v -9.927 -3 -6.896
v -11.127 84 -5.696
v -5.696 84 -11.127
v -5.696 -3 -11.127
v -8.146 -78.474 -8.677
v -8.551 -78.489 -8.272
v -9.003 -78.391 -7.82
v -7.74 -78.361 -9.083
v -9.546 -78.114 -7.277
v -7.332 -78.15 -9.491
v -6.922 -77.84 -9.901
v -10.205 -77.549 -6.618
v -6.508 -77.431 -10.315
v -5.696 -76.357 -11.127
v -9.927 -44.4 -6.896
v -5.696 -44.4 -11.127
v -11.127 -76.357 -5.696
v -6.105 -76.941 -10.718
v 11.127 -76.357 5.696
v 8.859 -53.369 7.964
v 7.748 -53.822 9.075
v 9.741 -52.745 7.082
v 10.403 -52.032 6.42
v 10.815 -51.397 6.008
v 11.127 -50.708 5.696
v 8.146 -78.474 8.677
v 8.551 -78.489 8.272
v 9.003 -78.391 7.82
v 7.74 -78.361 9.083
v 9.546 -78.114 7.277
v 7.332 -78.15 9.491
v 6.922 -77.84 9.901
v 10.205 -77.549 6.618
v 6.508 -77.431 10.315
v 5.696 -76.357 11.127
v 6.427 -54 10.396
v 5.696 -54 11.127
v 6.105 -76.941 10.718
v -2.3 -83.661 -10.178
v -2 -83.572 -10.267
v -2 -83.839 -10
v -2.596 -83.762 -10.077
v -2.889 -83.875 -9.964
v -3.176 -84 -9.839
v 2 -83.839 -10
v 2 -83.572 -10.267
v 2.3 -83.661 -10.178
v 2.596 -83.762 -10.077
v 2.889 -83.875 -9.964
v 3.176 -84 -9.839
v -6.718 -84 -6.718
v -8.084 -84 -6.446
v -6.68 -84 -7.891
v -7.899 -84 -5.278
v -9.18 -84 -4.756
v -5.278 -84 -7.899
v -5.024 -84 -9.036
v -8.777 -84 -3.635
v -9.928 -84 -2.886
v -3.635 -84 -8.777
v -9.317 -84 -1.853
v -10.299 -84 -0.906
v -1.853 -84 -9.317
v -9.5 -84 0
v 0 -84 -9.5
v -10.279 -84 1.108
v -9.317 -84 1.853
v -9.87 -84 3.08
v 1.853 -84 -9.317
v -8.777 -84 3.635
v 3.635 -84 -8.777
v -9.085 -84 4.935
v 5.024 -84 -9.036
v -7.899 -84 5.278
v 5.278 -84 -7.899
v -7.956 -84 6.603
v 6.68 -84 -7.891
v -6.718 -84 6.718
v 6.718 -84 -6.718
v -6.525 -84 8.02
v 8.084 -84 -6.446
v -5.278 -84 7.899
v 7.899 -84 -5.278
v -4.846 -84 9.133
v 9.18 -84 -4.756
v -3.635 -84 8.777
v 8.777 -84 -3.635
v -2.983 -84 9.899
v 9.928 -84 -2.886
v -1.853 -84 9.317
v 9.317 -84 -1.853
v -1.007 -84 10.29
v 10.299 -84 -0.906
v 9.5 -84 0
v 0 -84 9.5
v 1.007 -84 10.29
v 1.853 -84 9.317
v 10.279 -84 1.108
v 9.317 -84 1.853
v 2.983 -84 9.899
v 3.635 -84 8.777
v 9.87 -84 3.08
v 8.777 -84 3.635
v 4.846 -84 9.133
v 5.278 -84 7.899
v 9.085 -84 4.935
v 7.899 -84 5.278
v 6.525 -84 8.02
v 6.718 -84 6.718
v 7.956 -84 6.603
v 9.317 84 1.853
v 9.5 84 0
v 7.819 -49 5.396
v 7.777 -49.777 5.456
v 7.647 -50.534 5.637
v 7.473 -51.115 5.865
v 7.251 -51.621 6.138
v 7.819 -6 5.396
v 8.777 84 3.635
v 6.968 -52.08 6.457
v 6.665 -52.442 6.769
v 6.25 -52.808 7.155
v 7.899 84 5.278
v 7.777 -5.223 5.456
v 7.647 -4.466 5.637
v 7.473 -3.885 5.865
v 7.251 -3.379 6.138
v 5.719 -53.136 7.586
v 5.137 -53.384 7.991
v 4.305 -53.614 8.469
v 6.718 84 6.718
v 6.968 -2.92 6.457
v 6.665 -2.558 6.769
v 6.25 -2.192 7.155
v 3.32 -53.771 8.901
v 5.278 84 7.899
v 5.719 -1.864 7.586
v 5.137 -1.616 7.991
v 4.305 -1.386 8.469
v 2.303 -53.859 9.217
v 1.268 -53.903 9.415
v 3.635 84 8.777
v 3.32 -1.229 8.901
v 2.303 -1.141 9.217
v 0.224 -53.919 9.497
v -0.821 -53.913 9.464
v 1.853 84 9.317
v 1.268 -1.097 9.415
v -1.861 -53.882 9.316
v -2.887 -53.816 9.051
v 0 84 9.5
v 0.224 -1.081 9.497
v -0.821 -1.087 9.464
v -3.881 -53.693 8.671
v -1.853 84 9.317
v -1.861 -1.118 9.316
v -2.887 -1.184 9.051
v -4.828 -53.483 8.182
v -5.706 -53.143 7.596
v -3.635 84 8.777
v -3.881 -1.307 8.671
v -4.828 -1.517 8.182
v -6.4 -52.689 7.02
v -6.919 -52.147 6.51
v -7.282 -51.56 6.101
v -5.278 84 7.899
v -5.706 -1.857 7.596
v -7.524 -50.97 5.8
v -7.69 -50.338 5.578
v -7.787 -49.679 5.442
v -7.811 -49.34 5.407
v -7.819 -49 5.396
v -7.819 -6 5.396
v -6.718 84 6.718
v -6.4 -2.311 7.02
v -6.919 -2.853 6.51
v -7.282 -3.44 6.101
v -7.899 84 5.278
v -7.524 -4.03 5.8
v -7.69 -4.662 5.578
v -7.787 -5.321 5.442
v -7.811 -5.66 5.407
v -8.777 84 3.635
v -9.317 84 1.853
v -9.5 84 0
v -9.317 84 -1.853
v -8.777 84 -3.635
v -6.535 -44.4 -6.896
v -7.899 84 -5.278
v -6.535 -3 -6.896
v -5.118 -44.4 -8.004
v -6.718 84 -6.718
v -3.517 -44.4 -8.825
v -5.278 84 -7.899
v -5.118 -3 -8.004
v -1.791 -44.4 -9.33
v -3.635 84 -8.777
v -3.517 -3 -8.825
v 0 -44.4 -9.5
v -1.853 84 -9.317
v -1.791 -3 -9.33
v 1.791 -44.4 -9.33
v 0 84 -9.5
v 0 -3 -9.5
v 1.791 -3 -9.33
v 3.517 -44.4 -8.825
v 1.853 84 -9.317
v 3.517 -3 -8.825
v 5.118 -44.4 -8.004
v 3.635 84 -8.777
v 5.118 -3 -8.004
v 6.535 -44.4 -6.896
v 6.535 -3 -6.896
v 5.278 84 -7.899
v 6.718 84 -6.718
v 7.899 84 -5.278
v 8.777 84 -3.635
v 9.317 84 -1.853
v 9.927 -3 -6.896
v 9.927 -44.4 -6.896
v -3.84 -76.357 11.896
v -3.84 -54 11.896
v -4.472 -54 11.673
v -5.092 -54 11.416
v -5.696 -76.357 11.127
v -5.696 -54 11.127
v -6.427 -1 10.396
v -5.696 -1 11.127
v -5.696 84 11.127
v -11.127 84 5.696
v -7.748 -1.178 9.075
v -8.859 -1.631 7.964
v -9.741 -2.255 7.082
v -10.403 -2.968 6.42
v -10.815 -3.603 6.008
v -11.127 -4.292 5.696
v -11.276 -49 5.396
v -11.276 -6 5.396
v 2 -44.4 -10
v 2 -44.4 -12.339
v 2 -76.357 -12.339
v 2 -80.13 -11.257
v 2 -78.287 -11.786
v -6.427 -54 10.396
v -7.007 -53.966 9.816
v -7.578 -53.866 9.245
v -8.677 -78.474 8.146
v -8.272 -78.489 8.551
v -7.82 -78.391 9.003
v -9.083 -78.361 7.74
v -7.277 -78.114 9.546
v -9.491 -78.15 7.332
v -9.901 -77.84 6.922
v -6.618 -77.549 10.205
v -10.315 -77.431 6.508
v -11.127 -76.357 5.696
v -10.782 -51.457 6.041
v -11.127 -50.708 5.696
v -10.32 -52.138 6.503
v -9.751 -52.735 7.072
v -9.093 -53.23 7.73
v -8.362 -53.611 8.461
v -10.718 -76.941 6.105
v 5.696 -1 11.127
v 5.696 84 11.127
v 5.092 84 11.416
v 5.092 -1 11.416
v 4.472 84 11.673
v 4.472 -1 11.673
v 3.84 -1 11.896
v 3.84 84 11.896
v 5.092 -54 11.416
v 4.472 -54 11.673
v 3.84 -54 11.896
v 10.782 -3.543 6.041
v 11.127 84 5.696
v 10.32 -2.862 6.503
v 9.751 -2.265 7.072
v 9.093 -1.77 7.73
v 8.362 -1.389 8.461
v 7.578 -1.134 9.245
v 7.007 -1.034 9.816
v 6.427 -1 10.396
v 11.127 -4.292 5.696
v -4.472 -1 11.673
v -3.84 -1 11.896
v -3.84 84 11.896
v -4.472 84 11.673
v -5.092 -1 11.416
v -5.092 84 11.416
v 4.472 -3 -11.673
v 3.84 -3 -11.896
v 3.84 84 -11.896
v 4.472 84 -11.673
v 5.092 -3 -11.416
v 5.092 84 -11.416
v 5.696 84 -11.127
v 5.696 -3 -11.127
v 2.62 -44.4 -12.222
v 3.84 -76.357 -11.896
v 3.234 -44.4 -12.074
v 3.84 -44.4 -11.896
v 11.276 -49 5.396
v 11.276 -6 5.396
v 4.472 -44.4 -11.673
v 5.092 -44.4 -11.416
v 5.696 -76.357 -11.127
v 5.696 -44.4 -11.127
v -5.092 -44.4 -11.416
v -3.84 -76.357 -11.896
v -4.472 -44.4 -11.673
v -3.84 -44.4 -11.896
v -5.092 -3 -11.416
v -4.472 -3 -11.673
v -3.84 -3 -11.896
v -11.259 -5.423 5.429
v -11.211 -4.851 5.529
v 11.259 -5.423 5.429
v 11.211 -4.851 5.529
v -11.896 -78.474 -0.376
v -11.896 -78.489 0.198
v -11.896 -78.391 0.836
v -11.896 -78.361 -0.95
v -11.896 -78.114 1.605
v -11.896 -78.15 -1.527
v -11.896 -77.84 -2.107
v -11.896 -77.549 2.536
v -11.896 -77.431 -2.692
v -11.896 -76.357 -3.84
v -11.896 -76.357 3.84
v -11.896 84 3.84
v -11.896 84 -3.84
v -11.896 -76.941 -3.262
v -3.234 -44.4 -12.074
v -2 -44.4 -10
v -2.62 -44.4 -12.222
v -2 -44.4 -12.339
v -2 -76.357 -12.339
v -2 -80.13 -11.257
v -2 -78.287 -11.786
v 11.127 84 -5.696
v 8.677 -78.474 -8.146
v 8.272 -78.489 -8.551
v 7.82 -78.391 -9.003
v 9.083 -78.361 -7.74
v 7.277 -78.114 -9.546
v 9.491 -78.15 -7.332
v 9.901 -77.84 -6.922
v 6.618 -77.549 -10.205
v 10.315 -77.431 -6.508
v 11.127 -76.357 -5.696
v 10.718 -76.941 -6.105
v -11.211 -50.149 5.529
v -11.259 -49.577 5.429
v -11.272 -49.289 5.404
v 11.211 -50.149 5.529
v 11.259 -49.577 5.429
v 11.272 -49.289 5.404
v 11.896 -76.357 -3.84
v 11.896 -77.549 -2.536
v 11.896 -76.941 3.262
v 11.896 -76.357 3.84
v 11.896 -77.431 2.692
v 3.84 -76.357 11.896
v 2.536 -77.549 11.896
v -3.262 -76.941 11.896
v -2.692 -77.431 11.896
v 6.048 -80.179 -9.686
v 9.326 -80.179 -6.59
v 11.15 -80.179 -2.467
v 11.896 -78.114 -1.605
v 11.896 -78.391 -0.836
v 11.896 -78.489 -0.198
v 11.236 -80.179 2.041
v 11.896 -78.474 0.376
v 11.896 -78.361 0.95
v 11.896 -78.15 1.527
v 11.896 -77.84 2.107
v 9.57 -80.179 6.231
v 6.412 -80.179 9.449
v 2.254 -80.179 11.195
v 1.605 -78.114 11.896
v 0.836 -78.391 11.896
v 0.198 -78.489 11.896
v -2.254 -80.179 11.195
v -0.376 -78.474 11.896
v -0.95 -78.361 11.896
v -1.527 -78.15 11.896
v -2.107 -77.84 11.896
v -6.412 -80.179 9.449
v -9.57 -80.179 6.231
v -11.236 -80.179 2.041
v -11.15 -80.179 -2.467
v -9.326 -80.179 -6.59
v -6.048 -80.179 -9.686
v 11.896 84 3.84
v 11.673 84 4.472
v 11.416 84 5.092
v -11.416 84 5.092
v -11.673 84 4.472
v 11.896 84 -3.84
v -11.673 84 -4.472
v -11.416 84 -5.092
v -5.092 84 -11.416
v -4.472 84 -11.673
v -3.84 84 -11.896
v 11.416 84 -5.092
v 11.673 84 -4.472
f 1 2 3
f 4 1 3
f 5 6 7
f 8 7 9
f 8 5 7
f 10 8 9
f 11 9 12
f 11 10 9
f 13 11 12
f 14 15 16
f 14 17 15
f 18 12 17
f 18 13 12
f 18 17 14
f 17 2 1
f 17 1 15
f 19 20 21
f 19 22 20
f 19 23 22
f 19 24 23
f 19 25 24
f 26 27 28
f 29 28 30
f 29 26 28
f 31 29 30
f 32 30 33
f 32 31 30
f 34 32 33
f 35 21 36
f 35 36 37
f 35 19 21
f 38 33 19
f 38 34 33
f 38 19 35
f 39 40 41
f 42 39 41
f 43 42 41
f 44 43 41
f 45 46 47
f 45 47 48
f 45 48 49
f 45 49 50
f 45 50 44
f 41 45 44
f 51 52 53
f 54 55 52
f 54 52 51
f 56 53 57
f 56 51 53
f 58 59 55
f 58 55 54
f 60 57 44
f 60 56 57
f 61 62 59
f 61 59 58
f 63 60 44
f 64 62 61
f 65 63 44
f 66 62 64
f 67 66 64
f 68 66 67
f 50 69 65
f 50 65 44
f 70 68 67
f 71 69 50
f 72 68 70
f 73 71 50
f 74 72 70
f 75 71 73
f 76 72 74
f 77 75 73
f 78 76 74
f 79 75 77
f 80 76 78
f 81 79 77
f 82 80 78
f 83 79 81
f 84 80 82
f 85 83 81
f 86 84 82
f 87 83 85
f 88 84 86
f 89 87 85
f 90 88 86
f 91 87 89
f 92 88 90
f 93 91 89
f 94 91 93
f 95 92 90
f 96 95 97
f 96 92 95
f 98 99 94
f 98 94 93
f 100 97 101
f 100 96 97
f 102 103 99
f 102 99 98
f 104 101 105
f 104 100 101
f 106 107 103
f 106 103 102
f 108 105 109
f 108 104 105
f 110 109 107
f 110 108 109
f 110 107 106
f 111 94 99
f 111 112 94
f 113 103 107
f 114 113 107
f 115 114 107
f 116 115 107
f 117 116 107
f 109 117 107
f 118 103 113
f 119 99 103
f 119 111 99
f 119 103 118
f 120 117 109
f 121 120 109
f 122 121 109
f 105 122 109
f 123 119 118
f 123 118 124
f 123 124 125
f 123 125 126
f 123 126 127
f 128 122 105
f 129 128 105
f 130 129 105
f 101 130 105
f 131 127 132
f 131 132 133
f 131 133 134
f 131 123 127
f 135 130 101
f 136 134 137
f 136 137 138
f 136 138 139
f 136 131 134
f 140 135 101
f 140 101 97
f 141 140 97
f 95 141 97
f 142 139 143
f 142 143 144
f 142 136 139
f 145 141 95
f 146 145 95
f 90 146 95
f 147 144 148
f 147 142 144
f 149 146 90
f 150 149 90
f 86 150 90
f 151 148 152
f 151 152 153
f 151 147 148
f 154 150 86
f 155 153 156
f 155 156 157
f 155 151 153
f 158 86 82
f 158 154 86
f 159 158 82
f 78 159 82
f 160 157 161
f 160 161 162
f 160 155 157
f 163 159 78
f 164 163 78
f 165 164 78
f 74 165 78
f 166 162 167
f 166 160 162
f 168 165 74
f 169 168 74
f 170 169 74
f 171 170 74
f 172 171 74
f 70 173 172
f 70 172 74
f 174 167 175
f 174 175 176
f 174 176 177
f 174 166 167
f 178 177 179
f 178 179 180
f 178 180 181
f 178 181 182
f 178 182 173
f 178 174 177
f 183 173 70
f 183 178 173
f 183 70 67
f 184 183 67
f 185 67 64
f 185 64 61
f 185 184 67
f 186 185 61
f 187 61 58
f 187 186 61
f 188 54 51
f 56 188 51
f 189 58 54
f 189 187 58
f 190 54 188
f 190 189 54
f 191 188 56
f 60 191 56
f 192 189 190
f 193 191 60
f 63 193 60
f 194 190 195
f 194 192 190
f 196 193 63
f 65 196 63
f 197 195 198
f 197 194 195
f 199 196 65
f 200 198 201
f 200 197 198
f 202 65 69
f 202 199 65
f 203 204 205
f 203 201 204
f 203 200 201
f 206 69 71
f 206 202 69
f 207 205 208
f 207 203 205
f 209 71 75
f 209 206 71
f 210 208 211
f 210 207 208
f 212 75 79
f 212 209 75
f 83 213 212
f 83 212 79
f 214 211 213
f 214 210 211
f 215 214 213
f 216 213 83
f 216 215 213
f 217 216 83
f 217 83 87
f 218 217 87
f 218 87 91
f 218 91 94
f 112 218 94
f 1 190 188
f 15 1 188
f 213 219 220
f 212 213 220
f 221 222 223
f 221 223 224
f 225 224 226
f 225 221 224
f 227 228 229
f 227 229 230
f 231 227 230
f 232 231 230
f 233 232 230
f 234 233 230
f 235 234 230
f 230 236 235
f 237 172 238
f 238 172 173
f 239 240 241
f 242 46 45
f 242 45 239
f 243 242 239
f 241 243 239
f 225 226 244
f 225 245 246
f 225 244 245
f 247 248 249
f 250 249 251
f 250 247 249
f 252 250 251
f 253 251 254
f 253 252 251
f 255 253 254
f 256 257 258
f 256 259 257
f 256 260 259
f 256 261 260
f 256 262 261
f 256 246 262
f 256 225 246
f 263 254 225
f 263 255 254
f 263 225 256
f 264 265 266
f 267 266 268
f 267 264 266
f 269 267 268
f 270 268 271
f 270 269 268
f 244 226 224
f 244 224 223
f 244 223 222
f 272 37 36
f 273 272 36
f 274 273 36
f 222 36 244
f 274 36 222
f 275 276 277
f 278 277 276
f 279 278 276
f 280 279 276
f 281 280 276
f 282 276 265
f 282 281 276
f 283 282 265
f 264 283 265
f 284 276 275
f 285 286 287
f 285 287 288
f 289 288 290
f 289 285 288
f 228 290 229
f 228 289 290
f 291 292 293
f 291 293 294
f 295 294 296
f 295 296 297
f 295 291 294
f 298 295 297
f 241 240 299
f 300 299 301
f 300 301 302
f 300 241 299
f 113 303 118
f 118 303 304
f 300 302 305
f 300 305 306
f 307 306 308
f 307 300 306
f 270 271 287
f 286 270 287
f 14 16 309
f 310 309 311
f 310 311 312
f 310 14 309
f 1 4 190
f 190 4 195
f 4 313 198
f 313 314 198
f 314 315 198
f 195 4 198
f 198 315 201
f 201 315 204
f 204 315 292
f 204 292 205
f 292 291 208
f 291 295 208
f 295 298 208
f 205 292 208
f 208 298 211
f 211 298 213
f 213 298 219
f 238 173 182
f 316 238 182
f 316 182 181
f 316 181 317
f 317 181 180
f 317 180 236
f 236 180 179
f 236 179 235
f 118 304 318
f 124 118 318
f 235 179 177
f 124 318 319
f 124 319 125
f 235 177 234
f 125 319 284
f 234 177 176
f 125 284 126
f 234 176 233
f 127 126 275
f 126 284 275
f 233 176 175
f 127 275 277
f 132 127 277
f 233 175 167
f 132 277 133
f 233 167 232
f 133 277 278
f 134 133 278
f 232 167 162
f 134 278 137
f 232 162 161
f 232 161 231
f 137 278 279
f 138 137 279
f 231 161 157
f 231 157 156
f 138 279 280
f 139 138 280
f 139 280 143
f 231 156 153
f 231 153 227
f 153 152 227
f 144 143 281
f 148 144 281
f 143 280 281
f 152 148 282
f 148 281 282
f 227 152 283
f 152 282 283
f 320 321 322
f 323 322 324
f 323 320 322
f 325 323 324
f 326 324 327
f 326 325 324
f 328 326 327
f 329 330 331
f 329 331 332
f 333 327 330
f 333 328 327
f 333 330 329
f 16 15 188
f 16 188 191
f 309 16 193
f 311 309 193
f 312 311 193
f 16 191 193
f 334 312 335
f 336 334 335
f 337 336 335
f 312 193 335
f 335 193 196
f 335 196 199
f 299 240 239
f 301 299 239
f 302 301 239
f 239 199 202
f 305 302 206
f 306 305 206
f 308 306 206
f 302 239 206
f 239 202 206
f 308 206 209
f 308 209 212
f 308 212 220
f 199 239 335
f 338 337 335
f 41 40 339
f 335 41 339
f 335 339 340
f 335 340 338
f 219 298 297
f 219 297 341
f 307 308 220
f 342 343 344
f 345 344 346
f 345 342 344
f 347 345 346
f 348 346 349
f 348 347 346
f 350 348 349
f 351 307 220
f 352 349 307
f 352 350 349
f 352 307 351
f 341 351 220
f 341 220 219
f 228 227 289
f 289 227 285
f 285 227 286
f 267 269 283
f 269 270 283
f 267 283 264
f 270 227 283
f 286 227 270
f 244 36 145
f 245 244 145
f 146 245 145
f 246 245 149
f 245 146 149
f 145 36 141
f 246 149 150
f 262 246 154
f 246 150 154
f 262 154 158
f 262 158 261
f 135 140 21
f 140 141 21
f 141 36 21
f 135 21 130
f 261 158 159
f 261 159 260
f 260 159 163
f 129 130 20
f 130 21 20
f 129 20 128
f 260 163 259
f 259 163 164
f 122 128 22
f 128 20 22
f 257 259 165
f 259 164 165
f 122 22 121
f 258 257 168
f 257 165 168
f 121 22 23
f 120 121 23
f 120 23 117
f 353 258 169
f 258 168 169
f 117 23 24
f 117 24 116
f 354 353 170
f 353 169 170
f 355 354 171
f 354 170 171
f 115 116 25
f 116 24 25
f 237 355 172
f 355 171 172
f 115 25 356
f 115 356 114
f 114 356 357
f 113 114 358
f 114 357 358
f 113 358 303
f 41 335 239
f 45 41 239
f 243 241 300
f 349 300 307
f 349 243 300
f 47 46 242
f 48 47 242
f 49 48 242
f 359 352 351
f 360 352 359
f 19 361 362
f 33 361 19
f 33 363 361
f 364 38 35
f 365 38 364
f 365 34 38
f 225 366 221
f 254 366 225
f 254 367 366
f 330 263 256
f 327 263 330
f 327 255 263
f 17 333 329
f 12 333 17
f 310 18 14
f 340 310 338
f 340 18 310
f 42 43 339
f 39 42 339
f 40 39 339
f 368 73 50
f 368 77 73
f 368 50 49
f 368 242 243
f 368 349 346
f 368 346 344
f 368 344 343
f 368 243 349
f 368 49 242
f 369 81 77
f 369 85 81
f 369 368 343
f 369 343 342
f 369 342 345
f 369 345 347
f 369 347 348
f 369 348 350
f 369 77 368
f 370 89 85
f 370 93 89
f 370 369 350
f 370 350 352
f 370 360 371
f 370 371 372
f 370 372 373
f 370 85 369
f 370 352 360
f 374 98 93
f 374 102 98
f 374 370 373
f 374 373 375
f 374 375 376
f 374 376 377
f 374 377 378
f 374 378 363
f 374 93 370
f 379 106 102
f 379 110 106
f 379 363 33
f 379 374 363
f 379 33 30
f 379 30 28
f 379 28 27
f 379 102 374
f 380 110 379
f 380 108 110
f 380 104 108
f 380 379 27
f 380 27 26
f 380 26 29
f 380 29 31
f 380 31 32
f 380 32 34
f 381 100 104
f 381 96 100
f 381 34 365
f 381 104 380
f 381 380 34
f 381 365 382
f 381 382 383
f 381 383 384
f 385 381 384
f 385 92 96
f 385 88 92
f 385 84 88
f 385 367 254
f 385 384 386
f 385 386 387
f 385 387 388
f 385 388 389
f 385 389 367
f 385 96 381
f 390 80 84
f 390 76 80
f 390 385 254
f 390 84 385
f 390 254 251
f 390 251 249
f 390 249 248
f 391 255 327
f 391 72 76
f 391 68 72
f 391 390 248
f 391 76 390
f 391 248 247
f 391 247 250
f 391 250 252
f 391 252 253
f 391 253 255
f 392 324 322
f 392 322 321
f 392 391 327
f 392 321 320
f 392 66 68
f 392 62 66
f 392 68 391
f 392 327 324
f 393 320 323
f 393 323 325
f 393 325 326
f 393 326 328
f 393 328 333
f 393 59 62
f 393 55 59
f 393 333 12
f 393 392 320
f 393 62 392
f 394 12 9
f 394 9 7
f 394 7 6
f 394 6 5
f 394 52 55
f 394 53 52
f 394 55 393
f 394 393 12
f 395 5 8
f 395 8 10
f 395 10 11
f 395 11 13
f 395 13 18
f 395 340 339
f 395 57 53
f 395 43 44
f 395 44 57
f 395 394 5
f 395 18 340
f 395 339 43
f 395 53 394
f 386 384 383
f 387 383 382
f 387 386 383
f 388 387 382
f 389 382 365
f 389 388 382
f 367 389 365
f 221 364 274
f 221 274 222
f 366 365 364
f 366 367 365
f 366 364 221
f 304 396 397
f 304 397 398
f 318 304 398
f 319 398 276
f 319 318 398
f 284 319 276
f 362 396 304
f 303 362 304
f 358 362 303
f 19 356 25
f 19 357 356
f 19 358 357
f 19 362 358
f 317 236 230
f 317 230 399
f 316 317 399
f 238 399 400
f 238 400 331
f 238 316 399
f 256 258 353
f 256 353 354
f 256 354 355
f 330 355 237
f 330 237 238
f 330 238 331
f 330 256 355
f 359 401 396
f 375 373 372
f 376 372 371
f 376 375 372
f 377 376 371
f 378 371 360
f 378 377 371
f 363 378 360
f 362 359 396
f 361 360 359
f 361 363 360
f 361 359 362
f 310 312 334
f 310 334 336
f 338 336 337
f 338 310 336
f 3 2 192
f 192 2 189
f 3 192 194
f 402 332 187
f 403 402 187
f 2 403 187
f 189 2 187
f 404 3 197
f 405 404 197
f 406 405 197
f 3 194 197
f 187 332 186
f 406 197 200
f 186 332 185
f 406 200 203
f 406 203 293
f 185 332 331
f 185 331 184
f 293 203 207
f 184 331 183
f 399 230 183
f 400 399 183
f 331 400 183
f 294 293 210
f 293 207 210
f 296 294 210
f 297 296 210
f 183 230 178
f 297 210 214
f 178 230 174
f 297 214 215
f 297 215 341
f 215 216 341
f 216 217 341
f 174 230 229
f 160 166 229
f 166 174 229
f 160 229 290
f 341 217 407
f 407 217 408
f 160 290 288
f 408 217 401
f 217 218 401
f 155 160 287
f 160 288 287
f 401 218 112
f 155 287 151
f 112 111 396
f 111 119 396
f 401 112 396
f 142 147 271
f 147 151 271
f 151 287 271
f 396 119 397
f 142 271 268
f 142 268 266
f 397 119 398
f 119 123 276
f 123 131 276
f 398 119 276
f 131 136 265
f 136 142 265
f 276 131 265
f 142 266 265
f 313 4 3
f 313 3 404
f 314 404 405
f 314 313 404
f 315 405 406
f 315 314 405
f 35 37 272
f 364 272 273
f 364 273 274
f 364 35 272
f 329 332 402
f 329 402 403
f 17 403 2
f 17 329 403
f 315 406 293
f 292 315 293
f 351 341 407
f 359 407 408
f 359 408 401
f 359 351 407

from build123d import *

# Parameters (mm, degrees)
F0_R      = 9.5
F1_DEPTH  = 84
F3_DEPTH  = 12.5
F5_DEPTH  = 12.5
F7_W      = 4
F7_H      = 3.791283
F8_DEPTH  = 50.14
F10_DEPTH = 39.6
F12_DEPTH = 12.5


with BuildPart() as f1:
    # F0 (on Front) → F1 (new body, symmetric)
    with BuildSketch(Plane.XZ):
        with BuildLine():
            Line((-11.895642, 3.839754), (-11.895642, -3.839754))
            ThreePointArc((-11.895642, -3.839754), (-11.548494, -4.783543), (-11.126605, -5.696373))
            Line((-11.126605, -5.696373), (-5.696373, -11.126605))
            ThreePointArc((-5.696373, -11.126605), (-4.783543, -11.548494), (-3.839754, -11.895642))
            Line((-3.839754, -11.895642), (3.839754, -11.895642))
            ThreePointArc((3.839754, -11.895642), (4.783543, -11.548494), (5.696373, -11.126605))
            Line((5.696373, -11.126605), (11.126605, -5.696373))
            ThreePointArc((11.126605, -5.696373), (11.548494, -4.783543), (11.895642, -3.839754))
            Line((11.895642, -3.839754), (11.895642, 3.839754))
            ThreePointArc((11.895642, 3.839754), (11.548494, 4.783543), (11.126605, 5.696373))
            Line((11.126605, 5.696373), (5.696373, 11.126605))
            ThreePointArc((5.696373, 11.126605), (4.783543, 11.548494), (3.839754, 11.895642))
            Line((3.839754, 11.895642), (-3.839754, 11.895642))
            ThreePointArc((-3.839754, 11.895642), (-4.783543, 11.548494), (-5.696373, 11.126605))
            Line((-5.696373, 11.126605), (-11.126605, 5.696373))
            ThreePointArc((-11.126605, 5.696373), (-11.548494, 4.783543), (-11.895642, 3.839754))
        make_face()
        Circle(F0_R, mode=Mode.SUBTRACT)
    extrude(amount=F1_DEPTH, both=True)

    # F2 (on Right) → F3 (cut, symmetric)
    with BuildSketch(Plane.YZ):
        with BuildLine():
            Line((-1, 23.303589), (-54, 23.303589))
            Line((-54, 23.303589), (-54, 10.395642))
            ThreePointArc((-54, 10.395642), (-52.535534, 6.860108), (-49, 5.395642))
            Line((-49, 5.395642), (-6, 5.395642))
            ThreePointArc((-6, 5.395642), (-2.464466, 6.860108), (-1, 10.395642))
            Line((-1, 10.395642), (-1, 23.303589))
        make_face()
    extrude(amount=F3_DEPTH, both=True, mode=Mode.SUBTRACT)

    # F4 (on Right) → F5 (cut, symmetric)
    with BuildSketch(Plane.YZ):
        Polygon((-44.4, -6.895642), (-44.4, -11.895642), (-44.4, -23.509938), (-3, -23.509938), (-3, -6.895642), align=None)
    extrude(amount=F5_DEPTH, both=True, mode=Mode.SUBTRACT)

    # F7 (on offset) → F8 (cut)
    with BuildSketch(Plane.XZ.offset(84)):
        with Locations((0, -11.895641)):
            Rectangle(F7_W, F7_H)
    extrude(amount=-F8_DEPTH, mode=Mode.SUBTRACT)

    # F9 (on offset) → F10 (join, through all)
    with BuildSketch(Plane.XZ.offset(84)):
        with BuildLine():
            Line((-2, -11.895642), (-3.839754, -11.895642))
            ThreePointArc((-3.839754, -11.895642), (-2.928278, -12.152168), (-2, -12.338963))
            Line((-2, -12.338963), (-2, -11.895642))
        make_face()
        with BuildLine():
            Line((3.839754, -11.895642), (2, -11.895642))
            Line((2, -11.895642), (2, -12.338963))
            ThreePointArc((2, -12.338963), (2.928278, -12.152168), (3.839754, -11.895642))
        make_face()
    extrude(amount=-F10_DEPTH)

    # F11 (on Right) → F12 (cut, symmetric)
    with BuildSketch(Plane.YZ):
        Polygon((-84, -9.838963), (-84, -12.338963), (-81.5, -12.338963), align=None)
    extrude(amount=F12_DEPTH, both=True, mode=Mode.SUBTRACT)

    # F13 (on Right) → F14 (revolve, cut)
    with BuildSketch(Plane.YZ):
        Polygon((-86.791411, -19.086694), (-67.18528, -15.093563), (-84, -10.338963), align=None)
    revolve(axis=Axis((0, -51.056053, 0), (0, -1, 0)), mode=Mode.SUBTRACT)


solid = f1.part
